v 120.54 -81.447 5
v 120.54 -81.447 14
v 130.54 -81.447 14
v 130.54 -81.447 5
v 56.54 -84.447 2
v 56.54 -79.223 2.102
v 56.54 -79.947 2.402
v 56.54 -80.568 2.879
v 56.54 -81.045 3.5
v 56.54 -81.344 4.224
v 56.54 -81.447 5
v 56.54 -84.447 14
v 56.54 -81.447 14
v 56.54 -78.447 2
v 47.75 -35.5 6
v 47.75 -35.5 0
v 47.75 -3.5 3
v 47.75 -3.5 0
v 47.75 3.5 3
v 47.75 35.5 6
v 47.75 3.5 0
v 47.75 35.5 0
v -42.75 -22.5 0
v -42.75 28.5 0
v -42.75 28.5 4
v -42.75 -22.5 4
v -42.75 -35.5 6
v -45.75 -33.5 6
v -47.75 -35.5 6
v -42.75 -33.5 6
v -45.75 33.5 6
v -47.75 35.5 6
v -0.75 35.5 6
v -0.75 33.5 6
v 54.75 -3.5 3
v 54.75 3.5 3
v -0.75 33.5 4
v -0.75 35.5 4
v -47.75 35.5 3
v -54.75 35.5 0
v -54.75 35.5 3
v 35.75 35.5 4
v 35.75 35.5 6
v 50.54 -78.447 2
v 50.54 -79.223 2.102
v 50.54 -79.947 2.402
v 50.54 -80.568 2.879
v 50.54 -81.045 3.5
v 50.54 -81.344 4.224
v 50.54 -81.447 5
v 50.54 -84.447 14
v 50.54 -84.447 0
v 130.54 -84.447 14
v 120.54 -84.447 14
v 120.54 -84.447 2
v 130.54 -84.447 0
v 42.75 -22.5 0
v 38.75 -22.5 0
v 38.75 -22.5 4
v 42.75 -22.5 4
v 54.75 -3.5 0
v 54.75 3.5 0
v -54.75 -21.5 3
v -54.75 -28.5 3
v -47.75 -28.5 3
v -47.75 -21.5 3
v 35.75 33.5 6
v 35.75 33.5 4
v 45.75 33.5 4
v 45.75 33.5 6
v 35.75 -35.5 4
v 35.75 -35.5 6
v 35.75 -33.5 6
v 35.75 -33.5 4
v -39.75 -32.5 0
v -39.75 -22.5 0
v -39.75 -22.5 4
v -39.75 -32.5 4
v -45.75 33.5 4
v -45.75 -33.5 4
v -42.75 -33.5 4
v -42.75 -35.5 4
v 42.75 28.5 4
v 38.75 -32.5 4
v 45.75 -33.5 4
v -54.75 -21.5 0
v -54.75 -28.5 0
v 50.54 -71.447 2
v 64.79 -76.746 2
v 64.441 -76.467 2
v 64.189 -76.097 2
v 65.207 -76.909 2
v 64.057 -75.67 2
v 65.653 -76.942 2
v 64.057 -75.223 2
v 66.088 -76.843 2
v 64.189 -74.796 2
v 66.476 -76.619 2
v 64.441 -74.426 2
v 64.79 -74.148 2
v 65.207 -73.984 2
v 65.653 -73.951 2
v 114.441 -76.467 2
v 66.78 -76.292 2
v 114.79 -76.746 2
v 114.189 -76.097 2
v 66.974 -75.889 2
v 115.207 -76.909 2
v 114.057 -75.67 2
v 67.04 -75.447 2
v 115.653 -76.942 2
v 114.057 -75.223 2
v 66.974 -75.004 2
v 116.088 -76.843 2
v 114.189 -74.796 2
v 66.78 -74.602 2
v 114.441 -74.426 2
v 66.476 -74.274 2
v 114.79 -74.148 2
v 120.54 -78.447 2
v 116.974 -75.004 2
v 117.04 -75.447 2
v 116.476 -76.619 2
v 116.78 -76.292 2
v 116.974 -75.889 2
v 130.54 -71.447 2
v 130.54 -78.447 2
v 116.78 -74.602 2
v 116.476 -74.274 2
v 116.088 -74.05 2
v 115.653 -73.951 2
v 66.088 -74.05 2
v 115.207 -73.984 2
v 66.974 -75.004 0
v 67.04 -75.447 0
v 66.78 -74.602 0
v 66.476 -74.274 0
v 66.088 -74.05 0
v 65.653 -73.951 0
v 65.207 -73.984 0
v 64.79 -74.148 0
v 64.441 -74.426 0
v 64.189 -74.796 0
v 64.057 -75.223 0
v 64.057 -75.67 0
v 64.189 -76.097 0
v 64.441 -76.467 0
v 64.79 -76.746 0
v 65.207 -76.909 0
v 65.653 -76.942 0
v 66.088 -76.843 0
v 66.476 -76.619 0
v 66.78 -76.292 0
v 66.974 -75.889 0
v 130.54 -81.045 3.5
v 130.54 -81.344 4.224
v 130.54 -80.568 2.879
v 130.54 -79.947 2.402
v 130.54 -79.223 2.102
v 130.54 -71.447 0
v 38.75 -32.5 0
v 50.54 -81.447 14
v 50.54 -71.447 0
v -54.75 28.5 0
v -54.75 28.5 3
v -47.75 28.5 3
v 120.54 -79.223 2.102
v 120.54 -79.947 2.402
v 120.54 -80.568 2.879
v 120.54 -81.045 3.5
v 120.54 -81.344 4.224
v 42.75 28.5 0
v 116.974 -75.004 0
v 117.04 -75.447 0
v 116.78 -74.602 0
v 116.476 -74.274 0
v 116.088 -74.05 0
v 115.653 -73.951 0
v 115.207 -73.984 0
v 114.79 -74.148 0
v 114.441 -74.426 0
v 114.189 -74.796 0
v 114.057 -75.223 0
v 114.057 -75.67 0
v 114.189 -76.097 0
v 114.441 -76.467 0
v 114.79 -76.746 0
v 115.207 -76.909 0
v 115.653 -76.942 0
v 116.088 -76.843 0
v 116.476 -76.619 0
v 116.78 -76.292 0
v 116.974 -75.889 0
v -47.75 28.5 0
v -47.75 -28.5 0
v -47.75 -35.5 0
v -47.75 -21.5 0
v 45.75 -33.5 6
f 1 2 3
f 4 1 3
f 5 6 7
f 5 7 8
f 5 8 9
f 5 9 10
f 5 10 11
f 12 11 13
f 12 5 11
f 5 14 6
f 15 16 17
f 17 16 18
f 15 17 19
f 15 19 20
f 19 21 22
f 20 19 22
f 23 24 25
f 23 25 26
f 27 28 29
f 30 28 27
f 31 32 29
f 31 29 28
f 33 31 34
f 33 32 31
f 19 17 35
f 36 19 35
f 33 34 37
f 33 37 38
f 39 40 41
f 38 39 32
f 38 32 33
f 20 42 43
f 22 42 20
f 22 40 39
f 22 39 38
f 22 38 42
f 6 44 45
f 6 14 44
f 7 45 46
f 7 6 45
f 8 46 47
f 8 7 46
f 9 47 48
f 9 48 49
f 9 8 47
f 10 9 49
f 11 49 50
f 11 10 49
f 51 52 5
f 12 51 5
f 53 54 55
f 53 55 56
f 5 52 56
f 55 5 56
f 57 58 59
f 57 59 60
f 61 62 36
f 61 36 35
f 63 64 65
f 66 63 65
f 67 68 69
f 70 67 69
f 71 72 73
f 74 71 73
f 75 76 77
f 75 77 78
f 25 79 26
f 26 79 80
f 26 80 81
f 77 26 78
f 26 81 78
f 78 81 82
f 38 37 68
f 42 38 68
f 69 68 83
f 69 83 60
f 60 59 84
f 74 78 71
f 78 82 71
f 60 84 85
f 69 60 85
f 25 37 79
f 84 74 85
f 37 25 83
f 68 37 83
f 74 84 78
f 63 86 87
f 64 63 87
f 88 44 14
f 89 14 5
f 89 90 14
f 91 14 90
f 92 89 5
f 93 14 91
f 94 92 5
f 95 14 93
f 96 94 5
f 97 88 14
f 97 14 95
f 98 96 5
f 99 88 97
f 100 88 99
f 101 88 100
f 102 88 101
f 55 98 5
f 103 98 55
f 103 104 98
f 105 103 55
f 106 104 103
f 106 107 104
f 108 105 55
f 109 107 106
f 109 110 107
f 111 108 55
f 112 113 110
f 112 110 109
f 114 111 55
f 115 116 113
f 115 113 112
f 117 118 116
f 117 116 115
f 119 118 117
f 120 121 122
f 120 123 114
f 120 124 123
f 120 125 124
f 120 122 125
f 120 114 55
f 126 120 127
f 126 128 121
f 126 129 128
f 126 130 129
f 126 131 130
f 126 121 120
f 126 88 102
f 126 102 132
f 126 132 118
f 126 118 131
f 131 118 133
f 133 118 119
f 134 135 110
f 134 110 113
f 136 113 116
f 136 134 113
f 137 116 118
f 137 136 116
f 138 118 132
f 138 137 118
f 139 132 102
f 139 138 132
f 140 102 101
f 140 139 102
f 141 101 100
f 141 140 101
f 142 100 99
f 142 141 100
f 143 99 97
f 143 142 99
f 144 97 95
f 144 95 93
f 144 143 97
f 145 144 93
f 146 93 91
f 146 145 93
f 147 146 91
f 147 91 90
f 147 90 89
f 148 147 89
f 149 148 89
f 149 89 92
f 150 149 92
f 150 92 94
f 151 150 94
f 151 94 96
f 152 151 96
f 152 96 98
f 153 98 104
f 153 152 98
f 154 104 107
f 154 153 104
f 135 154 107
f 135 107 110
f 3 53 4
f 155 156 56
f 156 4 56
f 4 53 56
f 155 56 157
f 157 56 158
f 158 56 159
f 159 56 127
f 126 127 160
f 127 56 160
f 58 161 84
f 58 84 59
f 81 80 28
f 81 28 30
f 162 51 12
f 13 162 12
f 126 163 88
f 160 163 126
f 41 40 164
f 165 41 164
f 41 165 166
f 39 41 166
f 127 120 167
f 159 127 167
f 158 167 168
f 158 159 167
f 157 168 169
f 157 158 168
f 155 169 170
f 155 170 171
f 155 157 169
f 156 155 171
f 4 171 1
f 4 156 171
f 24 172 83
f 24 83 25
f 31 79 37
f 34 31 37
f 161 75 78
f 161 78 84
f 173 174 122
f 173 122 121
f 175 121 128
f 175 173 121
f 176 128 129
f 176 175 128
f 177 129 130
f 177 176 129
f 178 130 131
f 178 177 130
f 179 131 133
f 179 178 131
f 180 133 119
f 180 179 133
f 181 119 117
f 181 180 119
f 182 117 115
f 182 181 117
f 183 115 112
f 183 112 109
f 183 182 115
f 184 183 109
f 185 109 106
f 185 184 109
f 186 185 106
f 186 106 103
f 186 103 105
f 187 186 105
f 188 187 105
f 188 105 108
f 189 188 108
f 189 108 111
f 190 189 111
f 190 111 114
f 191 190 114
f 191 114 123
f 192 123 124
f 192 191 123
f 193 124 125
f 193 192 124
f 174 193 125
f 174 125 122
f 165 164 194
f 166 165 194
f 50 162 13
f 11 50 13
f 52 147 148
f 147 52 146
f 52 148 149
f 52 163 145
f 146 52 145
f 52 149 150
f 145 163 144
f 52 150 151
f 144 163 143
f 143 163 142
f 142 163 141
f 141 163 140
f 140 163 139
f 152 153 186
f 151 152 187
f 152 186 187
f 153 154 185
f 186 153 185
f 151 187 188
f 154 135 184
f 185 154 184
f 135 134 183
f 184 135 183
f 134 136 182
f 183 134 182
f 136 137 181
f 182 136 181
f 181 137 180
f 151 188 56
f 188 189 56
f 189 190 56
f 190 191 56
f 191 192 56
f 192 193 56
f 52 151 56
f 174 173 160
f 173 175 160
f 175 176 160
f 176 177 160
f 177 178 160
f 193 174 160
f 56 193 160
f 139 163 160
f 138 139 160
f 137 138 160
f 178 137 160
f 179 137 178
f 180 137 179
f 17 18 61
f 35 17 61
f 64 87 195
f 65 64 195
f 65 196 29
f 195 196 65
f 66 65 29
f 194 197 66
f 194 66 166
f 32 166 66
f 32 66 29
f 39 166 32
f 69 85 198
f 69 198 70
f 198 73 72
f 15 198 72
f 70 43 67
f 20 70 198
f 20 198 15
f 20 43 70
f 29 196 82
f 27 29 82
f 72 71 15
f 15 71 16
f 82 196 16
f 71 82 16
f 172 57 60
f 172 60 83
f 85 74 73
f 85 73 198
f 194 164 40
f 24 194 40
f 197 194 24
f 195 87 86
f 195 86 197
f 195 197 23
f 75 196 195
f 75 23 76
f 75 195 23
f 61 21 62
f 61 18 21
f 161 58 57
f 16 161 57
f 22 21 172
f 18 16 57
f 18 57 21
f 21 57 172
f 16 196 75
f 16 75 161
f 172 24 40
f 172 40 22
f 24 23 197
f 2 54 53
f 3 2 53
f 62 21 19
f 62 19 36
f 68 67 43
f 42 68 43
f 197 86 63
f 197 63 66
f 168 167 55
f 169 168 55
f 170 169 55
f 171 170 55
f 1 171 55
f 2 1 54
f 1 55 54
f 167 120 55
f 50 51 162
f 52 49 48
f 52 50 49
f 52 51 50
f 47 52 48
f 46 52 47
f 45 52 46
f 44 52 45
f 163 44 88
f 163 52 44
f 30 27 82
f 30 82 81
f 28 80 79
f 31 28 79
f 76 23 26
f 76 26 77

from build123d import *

# Parameters (mm, degrees)
F0_W      = 95.5
F0_H      = 71
F0_W_2    = 91.5
F0_H_2    = 67
F1_DEPTH  = 6
F2_W      = 91.5
F2_H      = 67
F3_DEPTH  = 4
F4_W      = 78.5
F4_H      = 2
F4_W_2    = 36.5
F5_DEPTH  = 2
F6_W      = 7
F6_H      = 7
F7_DEPTH  = 3
F8_W      = 80
F8_H      = 13
F8_R      = 1.5
F9_DEPTH  = 2
F10_W     = 10
F10_H     = 14
F10_W_2   = 6
F11_DEPTH = 3
F12_R     = 3


with BuildPart() as f1:
    # F0 (on Top) → F1 (new body)
    with BuildSketch(Plane.XY):
        Rectangle(F0_W, F0_H)
        Rectangle(F0_W_2, F0_H_2, mode=Mode.SUBTRACT)
    extrude(amount=F1_DEPTH)

    # F2 (on face) → F3 (join)
    with BuildSketch(Plane(origin=(0, 0, 0), x_dir=(1, 0, 0), z_dir=(0, 0, -1))):
        Rectangle(F2_W, F2_H)
        Polygon((-30.75, -28.5), (-42.75, -28.5), (-42.75, 22.5), (-39.75, 22.5), (-39.75, 32.5), (38.75, 32.5), (38.75, 22.5), (42.75, 22.5), (42.75, -28.5), (-20.75, -28.5), align=None, mode=Mode.SUBTRACT)
    extrude(amount=-F3_DEPTH)

    # F4 (on face) → F5 (cut)
    with BuildSketch(Plane.XY.offset(6)):
        with Locations((-3.5, -34.5)):
            Rectangle(F4_W, F4_H)
        with Locations((17.5, 34.5)):
            Rectangle(F4_W_2, F4_H)
    extrude(amount=-F5_DEPTH, mode=Mode.SUBTRACT)

    # F6 (on face) → F7 (join)
    with BuildSketch(Plane(origin=(0, 0, 0), x_dir=(1, 0, 0), z_dir=(0, 0, -1))):
        with Locations((-51.25, 25)):
            Rectangle(F6_W, F6_H)
        with Locations((-51.25, -32)):
            Rectangle(F6_W, F6_H)
        with Locations((51.25, 0)):
            Rectangle(F6_W, F6_H)
    extrude(amount=-F7_DEPTH)


with BuildPart() as f9:
    # F8 (on Top) → F9 (new body)
    with BuildSketch(Plane.XY):
        with Locations((90.540446, -77.946569)):
            Rectangle(F8_W, F8_H)
        with Locations((65.540446, -75.446569)):
            Circle(F8_R, mode=Mode.SUBTRACT)
        with Locations((115.540446, -75.446569)):
            Circle(F8_R, mode=Mode.SUBTRACT)
    extrude(amount=F9_DEPTH)

    # F10 (on face) → F11 (join)
    with BuildSketch(Plane.XZ.offset(84.446569)):
        with Locations((125.540446, 7)):
            Rectangle(F10_W, F10_H)
        with Locations((53.540446, 7)):
            Rectangle(F10_W_2, F10_H)
    extrude(amount=-F11_DEPTH)

    # F12
    f12_edges = [f9.edges().sort_by_distance(p)[0] for p in [
        (53.540446, -81.446569, 2),
        (125.540446, -81.446569, 2),
    ]]
    fillet(f12_edges, radius=F12_R)


solid = Compound([f1.part, f9.part])
